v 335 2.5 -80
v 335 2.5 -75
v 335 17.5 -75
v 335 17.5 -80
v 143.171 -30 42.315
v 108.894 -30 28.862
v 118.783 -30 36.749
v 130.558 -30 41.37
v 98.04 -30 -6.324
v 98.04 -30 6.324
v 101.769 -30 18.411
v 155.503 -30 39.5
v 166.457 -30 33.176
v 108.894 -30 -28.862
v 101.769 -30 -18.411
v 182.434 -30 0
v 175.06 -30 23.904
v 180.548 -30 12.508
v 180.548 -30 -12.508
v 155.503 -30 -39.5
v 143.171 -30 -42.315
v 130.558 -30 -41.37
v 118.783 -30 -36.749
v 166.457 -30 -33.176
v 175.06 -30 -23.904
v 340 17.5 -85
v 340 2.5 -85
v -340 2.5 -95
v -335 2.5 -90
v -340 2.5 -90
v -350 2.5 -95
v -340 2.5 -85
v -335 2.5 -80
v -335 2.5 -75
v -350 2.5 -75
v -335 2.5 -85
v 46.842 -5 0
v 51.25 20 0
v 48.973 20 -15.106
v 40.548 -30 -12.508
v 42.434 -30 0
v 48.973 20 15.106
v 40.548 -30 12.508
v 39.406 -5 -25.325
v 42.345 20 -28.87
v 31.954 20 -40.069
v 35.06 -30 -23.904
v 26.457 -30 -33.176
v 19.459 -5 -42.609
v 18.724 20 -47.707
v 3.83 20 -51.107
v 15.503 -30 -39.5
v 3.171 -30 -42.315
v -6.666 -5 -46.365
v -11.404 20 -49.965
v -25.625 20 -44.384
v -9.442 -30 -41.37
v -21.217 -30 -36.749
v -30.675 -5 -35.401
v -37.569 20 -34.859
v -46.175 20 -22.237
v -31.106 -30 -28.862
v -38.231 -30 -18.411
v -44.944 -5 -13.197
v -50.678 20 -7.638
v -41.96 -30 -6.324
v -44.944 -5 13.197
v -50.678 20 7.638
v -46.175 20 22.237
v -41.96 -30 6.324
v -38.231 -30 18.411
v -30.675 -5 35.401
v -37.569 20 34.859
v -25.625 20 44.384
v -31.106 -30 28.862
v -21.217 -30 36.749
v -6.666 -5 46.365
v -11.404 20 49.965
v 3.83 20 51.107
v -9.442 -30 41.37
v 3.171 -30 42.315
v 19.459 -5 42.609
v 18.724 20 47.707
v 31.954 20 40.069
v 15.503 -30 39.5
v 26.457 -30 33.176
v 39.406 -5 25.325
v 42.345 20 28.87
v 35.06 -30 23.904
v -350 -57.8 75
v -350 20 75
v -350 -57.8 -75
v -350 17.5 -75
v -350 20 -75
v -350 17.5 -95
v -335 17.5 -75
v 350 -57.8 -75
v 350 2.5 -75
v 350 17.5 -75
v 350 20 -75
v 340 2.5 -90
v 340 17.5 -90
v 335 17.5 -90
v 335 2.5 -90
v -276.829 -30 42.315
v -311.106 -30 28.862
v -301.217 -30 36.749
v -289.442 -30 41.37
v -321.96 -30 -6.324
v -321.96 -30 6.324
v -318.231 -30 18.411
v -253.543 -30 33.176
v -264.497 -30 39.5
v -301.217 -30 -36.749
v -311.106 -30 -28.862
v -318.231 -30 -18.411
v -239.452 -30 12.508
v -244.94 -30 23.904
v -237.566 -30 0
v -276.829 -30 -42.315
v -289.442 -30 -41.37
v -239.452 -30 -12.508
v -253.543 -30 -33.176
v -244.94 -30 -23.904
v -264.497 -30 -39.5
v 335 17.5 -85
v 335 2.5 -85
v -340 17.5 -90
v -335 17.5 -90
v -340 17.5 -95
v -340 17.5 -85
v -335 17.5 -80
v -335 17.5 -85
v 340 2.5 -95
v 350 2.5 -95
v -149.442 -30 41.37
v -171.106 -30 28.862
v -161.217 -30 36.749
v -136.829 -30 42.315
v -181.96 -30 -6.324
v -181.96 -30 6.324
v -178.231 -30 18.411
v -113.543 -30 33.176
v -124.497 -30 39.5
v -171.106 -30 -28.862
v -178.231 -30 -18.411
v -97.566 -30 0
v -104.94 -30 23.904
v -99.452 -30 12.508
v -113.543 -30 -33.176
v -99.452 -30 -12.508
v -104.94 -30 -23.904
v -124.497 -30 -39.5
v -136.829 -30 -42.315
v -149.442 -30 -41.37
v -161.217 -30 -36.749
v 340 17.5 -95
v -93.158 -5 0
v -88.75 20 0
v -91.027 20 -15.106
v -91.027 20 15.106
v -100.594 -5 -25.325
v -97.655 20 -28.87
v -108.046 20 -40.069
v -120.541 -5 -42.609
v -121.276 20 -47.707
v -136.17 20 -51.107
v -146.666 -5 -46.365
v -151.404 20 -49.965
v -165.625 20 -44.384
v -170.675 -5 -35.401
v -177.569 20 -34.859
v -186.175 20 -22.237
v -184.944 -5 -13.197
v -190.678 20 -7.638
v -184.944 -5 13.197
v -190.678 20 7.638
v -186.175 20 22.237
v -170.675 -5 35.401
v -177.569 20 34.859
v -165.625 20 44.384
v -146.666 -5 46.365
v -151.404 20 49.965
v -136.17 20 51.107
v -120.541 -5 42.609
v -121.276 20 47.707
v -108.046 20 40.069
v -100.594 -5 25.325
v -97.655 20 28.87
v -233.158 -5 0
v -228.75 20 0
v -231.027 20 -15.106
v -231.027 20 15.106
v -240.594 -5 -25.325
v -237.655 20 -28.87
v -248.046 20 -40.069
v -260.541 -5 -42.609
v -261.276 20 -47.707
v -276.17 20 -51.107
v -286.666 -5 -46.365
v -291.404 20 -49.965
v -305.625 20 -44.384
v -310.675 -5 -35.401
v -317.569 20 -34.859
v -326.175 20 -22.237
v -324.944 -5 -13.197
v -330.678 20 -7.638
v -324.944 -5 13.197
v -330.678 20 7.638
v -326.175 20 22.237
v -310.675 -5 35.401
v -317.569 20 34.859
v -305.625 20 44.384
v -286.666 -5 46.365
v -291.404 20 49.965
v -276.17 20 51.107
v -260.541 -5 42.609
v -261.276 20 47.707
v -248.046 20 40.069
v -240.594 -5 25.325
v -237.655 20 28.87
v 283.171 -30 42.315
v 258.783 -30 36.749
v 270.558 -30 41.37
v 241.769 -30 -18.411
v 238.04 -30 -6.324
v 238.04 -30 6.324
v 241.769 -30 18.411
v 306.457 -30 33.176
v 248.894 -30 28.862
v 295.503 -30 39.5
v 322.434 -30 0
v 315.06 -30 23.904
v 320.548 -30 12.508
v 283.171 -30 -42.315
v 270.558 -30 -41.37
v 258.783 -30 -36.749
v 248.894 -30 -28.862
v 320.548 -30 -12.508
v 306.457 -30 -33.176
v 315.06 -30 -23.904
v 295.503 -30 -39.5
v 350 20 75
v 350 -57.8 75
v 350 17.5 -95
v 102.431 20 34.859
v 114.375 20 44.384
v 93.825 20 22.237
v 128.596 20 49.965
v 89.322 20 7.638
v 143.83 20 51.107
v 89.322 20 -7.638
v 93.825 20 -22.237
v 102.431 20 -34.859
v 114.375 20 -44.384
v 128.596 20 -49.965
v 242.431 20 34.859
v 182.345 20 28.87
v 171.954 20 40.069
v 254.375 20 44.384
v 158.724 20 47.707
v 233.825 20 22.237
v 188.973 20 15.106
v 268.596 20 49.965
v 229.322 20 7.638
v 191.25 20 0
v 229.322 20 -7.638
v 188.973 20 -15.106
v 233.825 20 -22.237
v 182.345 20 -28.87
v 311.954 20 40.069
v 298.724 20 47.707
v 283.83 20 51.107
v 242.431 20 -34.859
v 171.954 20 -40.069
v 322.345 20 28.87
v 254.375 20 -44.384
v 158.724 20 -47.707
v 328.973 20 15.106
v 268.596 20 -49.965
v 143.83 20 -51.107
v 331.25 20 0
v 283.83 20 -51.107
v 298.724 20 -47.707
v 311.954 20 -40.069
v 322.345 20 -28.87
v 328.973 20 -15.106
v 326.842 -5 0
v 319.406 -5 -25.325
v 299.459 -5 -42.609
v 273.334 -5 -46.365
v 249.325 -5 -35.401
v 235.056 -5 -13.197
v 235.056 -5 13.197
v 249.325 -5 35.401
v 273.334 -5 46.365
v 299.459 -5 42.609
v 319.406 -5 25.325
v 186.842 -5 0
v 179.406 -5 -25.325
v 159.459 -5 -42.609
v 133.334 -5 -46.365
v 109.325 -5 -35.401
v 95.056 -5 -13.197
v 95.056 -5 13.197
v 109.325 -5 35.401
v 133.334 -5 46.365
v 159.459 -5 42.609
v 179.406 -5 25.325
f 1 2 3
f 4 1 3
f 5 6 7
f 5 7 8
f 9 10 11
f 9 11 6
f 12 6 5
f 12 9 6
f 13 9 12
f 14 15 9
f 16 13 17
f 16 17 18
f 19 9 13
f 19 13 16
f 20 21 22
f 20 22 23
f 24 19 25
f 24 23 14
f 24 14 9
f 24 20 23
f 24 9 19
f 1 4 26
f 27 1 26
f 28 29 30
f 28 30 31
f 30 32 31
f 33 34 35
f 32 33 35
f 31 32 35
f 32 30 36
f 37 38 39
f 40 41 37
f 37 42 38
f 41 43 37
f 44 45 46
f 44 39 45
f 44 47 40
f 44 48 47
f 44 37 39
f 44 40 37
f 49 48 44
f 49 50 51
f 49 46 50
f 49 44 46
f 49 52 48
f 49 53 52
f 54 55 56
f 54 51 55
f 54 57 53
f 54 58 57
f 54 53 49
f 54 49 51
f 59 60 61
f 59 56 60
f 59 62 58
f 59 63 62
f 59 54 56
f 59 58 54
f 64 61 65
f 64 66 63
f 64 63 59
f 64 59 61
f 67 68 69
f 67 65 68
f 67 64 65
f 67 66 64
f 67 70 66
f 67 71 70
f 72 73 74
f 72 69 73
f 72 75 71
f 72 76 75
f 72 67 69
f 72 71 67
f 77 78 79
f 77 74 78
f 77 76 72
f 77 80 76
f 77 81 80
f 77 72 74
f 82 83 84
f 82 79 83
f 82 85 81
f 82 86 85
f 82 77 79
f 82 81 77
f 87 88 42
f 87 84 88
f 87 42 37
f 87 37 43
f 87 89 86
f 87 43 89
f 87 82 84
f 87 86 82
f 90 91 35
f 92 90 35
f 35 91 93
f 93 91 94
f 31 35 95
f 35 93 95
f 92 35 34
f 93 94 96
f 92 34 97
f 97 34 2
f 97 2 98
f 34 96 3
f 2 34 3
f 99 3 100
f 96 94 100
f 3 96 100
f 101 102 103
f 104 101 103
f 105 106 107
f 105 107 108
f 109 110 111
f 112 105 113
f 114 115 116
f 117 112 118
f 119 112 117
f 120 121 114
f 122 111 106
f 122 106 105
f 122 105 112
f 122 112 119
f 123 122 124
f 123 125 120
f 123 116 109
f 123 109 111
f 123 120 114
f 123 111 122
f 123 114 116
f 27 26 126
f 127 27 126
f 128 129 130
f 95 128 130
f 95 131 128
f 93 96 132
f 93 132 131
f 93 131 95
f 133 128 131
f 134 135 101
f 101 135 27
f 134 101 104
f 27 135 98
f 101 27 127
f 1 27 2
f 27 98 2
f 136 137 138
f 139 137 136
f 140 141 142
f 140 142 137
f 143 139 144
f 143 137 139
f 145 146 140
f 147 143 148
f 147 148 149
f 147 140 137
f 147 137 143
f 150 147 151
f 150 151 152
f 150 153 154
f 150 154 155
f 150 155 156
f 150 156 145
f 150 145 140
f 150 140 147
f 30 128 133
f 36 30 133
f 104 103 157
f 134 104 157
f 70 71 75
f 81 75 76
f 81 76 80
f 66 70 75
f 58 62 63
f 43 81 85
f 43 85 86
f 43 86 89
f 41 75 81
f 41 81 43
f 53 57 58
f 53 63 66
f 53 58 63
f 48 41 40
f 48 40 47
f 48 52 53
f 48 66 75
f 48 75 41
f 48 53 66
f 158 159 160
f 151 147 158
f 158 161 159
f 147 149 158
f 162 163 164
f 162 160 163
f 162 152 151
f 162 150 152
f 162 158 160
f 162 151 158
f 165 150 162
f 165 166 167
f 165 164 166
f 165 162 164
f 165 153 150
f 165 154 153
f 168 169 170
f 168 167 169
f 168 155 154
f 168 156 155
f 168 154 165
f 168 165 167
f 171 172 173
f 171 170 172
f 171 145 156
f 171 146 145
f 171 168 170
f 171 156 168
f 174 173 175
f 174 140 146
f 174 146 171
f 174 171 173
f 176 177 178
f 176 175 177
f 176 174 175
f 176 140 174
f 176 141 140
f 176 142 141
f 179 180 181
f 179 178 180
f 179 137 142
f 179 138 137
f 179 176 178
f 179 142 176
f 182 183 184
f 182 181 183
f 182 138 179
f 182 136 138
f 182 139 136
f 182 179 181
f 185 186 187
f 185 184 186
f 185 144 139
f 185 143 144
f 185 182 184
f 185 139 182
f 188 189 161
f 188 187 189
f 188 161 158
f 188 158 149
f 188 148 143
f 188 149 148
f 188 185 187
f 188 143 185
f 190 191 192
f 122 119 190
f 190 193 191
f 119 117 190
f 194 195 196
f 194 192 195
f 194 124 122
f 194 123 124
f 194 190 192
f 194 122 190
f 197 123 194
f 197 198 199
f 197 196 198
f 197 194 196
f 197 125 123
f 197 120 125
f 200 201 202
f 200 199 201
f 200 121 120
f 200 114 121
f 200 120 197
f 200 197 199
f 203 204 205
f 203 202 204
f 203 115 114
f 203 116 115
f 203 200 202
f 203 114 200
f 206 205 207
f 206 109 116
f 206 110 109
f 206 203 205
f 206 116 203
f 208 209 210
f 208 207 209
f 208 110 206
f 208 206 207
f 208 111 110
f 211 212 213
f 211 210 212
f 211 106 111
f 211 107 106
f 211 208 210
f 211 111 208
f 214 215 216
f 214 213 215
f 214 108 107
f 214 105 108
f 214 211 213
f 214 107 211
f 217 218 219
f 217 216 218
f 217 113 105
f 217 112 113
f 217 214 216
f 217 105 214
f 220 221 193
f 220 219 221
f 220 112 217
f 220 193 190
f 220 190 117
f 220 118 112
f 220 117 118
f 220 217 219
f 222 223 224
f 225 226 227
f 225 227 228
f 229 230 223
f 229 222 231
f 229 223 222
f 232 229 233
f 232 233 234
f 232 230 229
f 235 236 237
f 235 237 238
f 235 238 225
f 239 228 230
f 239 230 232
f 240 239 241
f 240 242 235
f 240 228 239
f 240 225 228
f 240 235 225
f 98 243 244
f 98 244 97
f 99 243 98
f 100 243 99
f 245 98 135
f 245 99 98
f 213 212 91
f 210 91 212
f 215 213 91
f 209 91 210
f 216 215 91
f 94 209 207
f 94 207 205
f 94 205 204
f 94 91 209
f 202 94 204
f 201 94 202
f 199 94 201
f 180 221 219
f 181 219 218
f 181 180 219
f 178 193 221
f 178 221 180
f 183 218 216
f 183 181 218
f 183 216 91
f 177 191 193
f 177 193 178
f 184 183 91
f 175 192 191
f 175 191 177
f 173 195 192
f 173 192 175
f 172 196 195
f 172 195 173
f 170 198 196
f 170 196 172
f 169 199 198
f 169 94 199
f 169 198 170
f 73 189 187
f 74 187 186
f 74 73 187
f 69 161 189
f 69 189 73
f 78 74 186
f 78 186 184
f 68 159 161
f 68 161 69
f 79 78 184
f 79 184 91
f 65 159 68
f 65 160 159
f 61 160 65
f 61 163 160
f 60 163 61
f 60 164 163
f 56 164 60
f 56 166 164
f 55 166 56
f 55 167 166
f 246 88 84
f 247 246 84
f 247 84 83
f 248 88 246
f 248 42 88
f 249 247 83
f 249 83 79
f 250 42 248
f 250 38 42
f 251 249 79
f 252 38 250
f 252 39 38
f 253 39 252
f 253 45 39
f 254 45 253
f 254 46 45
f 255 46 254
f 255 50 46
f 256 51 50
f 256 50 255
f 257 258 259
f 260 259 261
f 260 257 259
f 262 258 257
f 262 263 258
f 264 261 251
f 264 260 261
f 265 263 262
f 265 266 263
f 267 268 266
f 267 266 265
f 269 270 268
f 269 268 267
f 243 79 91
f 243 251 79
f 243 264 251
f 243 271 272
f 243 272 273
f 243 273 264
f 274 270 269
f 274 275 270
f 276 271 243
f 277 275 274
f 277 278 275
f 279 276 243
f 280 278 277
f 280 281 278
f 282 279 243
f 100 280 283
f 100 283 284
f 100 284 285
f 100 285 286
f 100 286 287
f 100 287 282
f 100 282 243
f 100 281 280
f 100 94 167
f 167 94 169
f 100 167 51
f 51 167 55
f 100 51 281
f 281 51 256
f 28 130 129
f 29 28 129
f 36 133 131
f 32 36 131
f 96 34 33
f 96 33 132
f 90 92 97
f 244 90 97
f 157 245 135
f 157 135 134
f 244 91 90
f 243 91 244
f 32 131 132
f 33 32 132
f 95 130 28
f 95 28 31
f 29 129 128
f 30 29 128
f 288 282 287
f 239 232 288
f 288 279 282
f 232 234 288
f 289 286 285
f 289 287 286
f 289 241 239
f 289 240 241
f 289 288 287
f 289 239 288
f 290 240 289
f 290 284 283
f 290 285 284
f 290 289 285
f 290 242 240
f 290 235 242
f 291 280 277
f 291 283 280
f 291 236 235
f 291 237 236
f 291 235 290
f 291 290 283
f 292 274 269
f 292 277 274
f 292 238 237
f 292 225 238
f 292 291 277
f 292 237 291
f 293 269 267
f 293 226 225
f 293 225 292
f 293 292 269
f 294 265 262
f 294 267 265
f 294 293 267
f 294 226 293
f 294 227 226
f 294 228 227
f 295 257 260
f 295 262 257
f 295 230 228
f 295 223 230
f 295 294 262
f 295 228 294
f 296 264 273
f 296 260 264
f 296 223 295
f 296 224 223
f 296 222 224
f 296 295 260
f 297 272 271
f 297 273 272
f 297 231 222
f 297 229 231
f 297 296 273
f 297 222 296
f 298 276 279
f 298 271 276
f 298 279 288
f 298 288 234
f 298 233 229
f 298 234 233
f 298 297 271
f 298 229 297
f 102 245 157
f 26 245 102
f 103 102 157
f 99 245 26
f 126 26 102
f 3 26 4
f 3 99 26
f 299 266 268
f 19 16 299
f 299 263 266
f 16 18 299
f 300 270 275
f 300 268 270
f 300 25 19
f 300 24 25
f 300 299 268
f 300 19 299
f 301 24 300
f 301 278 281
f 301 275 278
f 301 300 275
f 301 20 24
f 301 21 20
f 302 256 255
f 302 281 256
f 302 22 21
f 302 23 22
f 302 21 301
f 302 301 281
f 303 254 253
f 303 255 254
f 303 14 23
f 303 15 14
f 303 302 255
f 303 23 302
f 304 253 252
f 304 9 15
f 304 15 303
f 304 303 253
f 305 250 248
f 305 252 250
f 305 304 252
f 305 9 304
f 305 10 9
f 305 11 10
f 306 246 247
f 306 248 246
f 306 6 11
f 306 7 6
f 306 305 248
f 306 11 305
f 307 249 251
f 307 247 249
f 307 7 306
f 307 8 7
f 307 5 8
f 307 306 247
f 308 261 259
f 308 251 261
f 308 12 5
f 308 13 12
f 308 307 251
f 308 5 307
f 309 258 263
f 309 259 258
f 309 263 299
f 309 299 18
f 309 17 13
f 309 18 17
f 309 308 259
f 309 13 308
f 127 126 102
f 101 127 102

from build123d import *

# Parameters (mm, degrees)
SKETCH1_W                = 700
SKETCH1_H                = 150
BOSS_EXTRUDE1_DEPTH      = 20
BOSS_EXTRUDE1_DEPTH_BACK = 57.8
SKETCH3_W                = 15
SKETCH3_H                = 15
BOSS_EXTRUDE2_DEPTH      = 20
CUT_EXTRUDE1_DEPTH       = 15
CUT_EXTRUDE2_DEPTH       = 15
SKETCH6_R                = 51.25
CUT_EXTRUDE3_DEPTH       = 50
CUT_EXTRUDE3_TAPER       = 10
SKETCH7_R                = 51.25
CUT_EXTRUDE4_DEPTH       = 50
CUT_EXTRUDE4_TAPER       = 10
SKETCH8_R                = 51.25
CUT_EXTRUDE5_DEPTH       = 50
CUT_EXTRUDE5_TAPER       = 10
SKETCH9_R                = 51.25
CUT_EXTRUDE6_DEPTH       = 50
CUT_EXTRUDE6_TAPER       = 10
SKETCH10_R               = 51.25
CUT_EXTRUDE7_DEPTH       = 50
CUT_EXTRUDE7_TAPER       = 10


with BuildPart() as part:
    # Sketch1 → Boss-Extrude1 (new body, two sides)
    with BuildSketch(Plane(origin=(0, 0, 0), x_dir=(1, 0, 0), z_dir=(0, 1, 0))) as boss_extrude1_sk:
        Rectangle(SKETCH1_W, SKETCH1_H)
    extrude(amount=BOSS_EXTRUDE1_DEPTH)
    extrude(boss_extrude1_sk.sketch, amount=-BOSS_EXTRUDE1_DEPTH_BACK)

    # Sketch3 → Boss-Extrude2 (add)
    with BuildSketch(Plane(origin=(0, 0, -75), x_dir=(-1, 0, 0), z_dir=(0, 0, -1))):
        with Locations((-342.5, 10)):
            Rectangle(SKETCH3_W, SKETCH3_H)
        with Locations((342.5, 10)):
            Rectangle(SKETCH3_W, SKETCH3_H)
    extrude(amount=BOSS_EXTRUDE2_DEPTH)

    # Sketch4 → Cut-Extrude1 (cut)
    with BuildSketch(Plane(origin=(0, 17.5, 0), x_dir=(1, 0, 0), z_dir=(0, 1, 0))):
        Polygon((340, 90), (335, 90), (335, 85), align=None)
        Polygon((340, 85), (335, 85), (335, 80), align=None)
        Polygon((335, 95), (335, 90), (340, 95), align=None)
    extrude(amount=-CUT_EXTRUDE1_DEPTH, mode=Mode.SUBTRACT)

    # Sketch5 → Cut-Extrude2 (cut)
    with BuildSketch(Plane(origin=(0, 17.5, 0), x_dir=(1, 0, 0), z_dir=(0, 1, 0))):
        Polygon((-335, 85), (-335, 90), (-340, 90), align=None)
        Polygon((-335, 90), (-335, 95), (-340, 95), align=None)
        Polygon((-335, 80), (-335, 85), (-340, 85), align=None)
    extrude(amount=-CUT_EXTRUDE2_DEPTH, mode=Mode.SUBTRACT)

    # Sketch6 → Cut-Extrude3 (cut)
    with BuildSketch(Plane(origin=(0, 20, 0), x_dir=(1, 0, 0), z_dir=(0, 1, 0))):
        Circle(SKETCH6_R)
    extrude(amount=-CUT_EXTRUDE3_DEPTH, taper=CUT_EXTRUDE3_TAPER, mode=Mode.SUBTRACT)

    # Sketch7 → Cut-Extrude4 (cut)
    with BuildSketch(Plane(origin=(0, 20, 0), x_dir=(1, 0, 0), z_dir=(0, 1, 0))):
        with Locations((140, 0)):
            Circle(SKETCH7_R)
    extrude(amount=-CUT_EXTRUDE4_DEPTH, taper=CUT_EXTRUDE4_TAPER, mode=Mode.SUBTRACT)

    # Sketch8 → Cut-Extrude5 (cut)
    with BuildSketch(Plane(origin=(0, 20, 0), x_dir=(1, 0, 0), z_dir=(0, 1, 0))):
        with Locations((280, 0)):
            Circle(SKETCH8_R)
    extrude(amount=-CUT_EXTRUDE5_DEPTH, taper=CUT_EXTRUDE5_TAPER, mode=Mode.SUBTRACT)

    # Sketch9 → Cut-Extrude6 (cut)
    with BuildSketch(Plane(origin=(0, 20, 0), x_dir=(1, 0, 0), z_dir=(0, 1, 0))):
        with Locations((-140, 0)):
            Circle(SKETCH9_R)
    extrude(amount=-CUT_EXTRUDE6_DEPTH, taper=CUT_EXTRUDE6_TAPER, mode=Mode.SUBTRACT)

    # Sketch10 → Cut-Extrude7 (cut)
    with BuildSketch(Plane(origin=(0, 20, 0), x_dir=(1, 0, 0), z_dir=(0, 1, 0))):
        with Locations((-280, 0)):
            Circle(SKETCH10_R)
    extrude(amount=-CUT_EXTRUDE7_DEPTH, taper=CUT_EXTRUDE7_TAPER, mode=Mode.SUBTRACT)


solid = part.part
